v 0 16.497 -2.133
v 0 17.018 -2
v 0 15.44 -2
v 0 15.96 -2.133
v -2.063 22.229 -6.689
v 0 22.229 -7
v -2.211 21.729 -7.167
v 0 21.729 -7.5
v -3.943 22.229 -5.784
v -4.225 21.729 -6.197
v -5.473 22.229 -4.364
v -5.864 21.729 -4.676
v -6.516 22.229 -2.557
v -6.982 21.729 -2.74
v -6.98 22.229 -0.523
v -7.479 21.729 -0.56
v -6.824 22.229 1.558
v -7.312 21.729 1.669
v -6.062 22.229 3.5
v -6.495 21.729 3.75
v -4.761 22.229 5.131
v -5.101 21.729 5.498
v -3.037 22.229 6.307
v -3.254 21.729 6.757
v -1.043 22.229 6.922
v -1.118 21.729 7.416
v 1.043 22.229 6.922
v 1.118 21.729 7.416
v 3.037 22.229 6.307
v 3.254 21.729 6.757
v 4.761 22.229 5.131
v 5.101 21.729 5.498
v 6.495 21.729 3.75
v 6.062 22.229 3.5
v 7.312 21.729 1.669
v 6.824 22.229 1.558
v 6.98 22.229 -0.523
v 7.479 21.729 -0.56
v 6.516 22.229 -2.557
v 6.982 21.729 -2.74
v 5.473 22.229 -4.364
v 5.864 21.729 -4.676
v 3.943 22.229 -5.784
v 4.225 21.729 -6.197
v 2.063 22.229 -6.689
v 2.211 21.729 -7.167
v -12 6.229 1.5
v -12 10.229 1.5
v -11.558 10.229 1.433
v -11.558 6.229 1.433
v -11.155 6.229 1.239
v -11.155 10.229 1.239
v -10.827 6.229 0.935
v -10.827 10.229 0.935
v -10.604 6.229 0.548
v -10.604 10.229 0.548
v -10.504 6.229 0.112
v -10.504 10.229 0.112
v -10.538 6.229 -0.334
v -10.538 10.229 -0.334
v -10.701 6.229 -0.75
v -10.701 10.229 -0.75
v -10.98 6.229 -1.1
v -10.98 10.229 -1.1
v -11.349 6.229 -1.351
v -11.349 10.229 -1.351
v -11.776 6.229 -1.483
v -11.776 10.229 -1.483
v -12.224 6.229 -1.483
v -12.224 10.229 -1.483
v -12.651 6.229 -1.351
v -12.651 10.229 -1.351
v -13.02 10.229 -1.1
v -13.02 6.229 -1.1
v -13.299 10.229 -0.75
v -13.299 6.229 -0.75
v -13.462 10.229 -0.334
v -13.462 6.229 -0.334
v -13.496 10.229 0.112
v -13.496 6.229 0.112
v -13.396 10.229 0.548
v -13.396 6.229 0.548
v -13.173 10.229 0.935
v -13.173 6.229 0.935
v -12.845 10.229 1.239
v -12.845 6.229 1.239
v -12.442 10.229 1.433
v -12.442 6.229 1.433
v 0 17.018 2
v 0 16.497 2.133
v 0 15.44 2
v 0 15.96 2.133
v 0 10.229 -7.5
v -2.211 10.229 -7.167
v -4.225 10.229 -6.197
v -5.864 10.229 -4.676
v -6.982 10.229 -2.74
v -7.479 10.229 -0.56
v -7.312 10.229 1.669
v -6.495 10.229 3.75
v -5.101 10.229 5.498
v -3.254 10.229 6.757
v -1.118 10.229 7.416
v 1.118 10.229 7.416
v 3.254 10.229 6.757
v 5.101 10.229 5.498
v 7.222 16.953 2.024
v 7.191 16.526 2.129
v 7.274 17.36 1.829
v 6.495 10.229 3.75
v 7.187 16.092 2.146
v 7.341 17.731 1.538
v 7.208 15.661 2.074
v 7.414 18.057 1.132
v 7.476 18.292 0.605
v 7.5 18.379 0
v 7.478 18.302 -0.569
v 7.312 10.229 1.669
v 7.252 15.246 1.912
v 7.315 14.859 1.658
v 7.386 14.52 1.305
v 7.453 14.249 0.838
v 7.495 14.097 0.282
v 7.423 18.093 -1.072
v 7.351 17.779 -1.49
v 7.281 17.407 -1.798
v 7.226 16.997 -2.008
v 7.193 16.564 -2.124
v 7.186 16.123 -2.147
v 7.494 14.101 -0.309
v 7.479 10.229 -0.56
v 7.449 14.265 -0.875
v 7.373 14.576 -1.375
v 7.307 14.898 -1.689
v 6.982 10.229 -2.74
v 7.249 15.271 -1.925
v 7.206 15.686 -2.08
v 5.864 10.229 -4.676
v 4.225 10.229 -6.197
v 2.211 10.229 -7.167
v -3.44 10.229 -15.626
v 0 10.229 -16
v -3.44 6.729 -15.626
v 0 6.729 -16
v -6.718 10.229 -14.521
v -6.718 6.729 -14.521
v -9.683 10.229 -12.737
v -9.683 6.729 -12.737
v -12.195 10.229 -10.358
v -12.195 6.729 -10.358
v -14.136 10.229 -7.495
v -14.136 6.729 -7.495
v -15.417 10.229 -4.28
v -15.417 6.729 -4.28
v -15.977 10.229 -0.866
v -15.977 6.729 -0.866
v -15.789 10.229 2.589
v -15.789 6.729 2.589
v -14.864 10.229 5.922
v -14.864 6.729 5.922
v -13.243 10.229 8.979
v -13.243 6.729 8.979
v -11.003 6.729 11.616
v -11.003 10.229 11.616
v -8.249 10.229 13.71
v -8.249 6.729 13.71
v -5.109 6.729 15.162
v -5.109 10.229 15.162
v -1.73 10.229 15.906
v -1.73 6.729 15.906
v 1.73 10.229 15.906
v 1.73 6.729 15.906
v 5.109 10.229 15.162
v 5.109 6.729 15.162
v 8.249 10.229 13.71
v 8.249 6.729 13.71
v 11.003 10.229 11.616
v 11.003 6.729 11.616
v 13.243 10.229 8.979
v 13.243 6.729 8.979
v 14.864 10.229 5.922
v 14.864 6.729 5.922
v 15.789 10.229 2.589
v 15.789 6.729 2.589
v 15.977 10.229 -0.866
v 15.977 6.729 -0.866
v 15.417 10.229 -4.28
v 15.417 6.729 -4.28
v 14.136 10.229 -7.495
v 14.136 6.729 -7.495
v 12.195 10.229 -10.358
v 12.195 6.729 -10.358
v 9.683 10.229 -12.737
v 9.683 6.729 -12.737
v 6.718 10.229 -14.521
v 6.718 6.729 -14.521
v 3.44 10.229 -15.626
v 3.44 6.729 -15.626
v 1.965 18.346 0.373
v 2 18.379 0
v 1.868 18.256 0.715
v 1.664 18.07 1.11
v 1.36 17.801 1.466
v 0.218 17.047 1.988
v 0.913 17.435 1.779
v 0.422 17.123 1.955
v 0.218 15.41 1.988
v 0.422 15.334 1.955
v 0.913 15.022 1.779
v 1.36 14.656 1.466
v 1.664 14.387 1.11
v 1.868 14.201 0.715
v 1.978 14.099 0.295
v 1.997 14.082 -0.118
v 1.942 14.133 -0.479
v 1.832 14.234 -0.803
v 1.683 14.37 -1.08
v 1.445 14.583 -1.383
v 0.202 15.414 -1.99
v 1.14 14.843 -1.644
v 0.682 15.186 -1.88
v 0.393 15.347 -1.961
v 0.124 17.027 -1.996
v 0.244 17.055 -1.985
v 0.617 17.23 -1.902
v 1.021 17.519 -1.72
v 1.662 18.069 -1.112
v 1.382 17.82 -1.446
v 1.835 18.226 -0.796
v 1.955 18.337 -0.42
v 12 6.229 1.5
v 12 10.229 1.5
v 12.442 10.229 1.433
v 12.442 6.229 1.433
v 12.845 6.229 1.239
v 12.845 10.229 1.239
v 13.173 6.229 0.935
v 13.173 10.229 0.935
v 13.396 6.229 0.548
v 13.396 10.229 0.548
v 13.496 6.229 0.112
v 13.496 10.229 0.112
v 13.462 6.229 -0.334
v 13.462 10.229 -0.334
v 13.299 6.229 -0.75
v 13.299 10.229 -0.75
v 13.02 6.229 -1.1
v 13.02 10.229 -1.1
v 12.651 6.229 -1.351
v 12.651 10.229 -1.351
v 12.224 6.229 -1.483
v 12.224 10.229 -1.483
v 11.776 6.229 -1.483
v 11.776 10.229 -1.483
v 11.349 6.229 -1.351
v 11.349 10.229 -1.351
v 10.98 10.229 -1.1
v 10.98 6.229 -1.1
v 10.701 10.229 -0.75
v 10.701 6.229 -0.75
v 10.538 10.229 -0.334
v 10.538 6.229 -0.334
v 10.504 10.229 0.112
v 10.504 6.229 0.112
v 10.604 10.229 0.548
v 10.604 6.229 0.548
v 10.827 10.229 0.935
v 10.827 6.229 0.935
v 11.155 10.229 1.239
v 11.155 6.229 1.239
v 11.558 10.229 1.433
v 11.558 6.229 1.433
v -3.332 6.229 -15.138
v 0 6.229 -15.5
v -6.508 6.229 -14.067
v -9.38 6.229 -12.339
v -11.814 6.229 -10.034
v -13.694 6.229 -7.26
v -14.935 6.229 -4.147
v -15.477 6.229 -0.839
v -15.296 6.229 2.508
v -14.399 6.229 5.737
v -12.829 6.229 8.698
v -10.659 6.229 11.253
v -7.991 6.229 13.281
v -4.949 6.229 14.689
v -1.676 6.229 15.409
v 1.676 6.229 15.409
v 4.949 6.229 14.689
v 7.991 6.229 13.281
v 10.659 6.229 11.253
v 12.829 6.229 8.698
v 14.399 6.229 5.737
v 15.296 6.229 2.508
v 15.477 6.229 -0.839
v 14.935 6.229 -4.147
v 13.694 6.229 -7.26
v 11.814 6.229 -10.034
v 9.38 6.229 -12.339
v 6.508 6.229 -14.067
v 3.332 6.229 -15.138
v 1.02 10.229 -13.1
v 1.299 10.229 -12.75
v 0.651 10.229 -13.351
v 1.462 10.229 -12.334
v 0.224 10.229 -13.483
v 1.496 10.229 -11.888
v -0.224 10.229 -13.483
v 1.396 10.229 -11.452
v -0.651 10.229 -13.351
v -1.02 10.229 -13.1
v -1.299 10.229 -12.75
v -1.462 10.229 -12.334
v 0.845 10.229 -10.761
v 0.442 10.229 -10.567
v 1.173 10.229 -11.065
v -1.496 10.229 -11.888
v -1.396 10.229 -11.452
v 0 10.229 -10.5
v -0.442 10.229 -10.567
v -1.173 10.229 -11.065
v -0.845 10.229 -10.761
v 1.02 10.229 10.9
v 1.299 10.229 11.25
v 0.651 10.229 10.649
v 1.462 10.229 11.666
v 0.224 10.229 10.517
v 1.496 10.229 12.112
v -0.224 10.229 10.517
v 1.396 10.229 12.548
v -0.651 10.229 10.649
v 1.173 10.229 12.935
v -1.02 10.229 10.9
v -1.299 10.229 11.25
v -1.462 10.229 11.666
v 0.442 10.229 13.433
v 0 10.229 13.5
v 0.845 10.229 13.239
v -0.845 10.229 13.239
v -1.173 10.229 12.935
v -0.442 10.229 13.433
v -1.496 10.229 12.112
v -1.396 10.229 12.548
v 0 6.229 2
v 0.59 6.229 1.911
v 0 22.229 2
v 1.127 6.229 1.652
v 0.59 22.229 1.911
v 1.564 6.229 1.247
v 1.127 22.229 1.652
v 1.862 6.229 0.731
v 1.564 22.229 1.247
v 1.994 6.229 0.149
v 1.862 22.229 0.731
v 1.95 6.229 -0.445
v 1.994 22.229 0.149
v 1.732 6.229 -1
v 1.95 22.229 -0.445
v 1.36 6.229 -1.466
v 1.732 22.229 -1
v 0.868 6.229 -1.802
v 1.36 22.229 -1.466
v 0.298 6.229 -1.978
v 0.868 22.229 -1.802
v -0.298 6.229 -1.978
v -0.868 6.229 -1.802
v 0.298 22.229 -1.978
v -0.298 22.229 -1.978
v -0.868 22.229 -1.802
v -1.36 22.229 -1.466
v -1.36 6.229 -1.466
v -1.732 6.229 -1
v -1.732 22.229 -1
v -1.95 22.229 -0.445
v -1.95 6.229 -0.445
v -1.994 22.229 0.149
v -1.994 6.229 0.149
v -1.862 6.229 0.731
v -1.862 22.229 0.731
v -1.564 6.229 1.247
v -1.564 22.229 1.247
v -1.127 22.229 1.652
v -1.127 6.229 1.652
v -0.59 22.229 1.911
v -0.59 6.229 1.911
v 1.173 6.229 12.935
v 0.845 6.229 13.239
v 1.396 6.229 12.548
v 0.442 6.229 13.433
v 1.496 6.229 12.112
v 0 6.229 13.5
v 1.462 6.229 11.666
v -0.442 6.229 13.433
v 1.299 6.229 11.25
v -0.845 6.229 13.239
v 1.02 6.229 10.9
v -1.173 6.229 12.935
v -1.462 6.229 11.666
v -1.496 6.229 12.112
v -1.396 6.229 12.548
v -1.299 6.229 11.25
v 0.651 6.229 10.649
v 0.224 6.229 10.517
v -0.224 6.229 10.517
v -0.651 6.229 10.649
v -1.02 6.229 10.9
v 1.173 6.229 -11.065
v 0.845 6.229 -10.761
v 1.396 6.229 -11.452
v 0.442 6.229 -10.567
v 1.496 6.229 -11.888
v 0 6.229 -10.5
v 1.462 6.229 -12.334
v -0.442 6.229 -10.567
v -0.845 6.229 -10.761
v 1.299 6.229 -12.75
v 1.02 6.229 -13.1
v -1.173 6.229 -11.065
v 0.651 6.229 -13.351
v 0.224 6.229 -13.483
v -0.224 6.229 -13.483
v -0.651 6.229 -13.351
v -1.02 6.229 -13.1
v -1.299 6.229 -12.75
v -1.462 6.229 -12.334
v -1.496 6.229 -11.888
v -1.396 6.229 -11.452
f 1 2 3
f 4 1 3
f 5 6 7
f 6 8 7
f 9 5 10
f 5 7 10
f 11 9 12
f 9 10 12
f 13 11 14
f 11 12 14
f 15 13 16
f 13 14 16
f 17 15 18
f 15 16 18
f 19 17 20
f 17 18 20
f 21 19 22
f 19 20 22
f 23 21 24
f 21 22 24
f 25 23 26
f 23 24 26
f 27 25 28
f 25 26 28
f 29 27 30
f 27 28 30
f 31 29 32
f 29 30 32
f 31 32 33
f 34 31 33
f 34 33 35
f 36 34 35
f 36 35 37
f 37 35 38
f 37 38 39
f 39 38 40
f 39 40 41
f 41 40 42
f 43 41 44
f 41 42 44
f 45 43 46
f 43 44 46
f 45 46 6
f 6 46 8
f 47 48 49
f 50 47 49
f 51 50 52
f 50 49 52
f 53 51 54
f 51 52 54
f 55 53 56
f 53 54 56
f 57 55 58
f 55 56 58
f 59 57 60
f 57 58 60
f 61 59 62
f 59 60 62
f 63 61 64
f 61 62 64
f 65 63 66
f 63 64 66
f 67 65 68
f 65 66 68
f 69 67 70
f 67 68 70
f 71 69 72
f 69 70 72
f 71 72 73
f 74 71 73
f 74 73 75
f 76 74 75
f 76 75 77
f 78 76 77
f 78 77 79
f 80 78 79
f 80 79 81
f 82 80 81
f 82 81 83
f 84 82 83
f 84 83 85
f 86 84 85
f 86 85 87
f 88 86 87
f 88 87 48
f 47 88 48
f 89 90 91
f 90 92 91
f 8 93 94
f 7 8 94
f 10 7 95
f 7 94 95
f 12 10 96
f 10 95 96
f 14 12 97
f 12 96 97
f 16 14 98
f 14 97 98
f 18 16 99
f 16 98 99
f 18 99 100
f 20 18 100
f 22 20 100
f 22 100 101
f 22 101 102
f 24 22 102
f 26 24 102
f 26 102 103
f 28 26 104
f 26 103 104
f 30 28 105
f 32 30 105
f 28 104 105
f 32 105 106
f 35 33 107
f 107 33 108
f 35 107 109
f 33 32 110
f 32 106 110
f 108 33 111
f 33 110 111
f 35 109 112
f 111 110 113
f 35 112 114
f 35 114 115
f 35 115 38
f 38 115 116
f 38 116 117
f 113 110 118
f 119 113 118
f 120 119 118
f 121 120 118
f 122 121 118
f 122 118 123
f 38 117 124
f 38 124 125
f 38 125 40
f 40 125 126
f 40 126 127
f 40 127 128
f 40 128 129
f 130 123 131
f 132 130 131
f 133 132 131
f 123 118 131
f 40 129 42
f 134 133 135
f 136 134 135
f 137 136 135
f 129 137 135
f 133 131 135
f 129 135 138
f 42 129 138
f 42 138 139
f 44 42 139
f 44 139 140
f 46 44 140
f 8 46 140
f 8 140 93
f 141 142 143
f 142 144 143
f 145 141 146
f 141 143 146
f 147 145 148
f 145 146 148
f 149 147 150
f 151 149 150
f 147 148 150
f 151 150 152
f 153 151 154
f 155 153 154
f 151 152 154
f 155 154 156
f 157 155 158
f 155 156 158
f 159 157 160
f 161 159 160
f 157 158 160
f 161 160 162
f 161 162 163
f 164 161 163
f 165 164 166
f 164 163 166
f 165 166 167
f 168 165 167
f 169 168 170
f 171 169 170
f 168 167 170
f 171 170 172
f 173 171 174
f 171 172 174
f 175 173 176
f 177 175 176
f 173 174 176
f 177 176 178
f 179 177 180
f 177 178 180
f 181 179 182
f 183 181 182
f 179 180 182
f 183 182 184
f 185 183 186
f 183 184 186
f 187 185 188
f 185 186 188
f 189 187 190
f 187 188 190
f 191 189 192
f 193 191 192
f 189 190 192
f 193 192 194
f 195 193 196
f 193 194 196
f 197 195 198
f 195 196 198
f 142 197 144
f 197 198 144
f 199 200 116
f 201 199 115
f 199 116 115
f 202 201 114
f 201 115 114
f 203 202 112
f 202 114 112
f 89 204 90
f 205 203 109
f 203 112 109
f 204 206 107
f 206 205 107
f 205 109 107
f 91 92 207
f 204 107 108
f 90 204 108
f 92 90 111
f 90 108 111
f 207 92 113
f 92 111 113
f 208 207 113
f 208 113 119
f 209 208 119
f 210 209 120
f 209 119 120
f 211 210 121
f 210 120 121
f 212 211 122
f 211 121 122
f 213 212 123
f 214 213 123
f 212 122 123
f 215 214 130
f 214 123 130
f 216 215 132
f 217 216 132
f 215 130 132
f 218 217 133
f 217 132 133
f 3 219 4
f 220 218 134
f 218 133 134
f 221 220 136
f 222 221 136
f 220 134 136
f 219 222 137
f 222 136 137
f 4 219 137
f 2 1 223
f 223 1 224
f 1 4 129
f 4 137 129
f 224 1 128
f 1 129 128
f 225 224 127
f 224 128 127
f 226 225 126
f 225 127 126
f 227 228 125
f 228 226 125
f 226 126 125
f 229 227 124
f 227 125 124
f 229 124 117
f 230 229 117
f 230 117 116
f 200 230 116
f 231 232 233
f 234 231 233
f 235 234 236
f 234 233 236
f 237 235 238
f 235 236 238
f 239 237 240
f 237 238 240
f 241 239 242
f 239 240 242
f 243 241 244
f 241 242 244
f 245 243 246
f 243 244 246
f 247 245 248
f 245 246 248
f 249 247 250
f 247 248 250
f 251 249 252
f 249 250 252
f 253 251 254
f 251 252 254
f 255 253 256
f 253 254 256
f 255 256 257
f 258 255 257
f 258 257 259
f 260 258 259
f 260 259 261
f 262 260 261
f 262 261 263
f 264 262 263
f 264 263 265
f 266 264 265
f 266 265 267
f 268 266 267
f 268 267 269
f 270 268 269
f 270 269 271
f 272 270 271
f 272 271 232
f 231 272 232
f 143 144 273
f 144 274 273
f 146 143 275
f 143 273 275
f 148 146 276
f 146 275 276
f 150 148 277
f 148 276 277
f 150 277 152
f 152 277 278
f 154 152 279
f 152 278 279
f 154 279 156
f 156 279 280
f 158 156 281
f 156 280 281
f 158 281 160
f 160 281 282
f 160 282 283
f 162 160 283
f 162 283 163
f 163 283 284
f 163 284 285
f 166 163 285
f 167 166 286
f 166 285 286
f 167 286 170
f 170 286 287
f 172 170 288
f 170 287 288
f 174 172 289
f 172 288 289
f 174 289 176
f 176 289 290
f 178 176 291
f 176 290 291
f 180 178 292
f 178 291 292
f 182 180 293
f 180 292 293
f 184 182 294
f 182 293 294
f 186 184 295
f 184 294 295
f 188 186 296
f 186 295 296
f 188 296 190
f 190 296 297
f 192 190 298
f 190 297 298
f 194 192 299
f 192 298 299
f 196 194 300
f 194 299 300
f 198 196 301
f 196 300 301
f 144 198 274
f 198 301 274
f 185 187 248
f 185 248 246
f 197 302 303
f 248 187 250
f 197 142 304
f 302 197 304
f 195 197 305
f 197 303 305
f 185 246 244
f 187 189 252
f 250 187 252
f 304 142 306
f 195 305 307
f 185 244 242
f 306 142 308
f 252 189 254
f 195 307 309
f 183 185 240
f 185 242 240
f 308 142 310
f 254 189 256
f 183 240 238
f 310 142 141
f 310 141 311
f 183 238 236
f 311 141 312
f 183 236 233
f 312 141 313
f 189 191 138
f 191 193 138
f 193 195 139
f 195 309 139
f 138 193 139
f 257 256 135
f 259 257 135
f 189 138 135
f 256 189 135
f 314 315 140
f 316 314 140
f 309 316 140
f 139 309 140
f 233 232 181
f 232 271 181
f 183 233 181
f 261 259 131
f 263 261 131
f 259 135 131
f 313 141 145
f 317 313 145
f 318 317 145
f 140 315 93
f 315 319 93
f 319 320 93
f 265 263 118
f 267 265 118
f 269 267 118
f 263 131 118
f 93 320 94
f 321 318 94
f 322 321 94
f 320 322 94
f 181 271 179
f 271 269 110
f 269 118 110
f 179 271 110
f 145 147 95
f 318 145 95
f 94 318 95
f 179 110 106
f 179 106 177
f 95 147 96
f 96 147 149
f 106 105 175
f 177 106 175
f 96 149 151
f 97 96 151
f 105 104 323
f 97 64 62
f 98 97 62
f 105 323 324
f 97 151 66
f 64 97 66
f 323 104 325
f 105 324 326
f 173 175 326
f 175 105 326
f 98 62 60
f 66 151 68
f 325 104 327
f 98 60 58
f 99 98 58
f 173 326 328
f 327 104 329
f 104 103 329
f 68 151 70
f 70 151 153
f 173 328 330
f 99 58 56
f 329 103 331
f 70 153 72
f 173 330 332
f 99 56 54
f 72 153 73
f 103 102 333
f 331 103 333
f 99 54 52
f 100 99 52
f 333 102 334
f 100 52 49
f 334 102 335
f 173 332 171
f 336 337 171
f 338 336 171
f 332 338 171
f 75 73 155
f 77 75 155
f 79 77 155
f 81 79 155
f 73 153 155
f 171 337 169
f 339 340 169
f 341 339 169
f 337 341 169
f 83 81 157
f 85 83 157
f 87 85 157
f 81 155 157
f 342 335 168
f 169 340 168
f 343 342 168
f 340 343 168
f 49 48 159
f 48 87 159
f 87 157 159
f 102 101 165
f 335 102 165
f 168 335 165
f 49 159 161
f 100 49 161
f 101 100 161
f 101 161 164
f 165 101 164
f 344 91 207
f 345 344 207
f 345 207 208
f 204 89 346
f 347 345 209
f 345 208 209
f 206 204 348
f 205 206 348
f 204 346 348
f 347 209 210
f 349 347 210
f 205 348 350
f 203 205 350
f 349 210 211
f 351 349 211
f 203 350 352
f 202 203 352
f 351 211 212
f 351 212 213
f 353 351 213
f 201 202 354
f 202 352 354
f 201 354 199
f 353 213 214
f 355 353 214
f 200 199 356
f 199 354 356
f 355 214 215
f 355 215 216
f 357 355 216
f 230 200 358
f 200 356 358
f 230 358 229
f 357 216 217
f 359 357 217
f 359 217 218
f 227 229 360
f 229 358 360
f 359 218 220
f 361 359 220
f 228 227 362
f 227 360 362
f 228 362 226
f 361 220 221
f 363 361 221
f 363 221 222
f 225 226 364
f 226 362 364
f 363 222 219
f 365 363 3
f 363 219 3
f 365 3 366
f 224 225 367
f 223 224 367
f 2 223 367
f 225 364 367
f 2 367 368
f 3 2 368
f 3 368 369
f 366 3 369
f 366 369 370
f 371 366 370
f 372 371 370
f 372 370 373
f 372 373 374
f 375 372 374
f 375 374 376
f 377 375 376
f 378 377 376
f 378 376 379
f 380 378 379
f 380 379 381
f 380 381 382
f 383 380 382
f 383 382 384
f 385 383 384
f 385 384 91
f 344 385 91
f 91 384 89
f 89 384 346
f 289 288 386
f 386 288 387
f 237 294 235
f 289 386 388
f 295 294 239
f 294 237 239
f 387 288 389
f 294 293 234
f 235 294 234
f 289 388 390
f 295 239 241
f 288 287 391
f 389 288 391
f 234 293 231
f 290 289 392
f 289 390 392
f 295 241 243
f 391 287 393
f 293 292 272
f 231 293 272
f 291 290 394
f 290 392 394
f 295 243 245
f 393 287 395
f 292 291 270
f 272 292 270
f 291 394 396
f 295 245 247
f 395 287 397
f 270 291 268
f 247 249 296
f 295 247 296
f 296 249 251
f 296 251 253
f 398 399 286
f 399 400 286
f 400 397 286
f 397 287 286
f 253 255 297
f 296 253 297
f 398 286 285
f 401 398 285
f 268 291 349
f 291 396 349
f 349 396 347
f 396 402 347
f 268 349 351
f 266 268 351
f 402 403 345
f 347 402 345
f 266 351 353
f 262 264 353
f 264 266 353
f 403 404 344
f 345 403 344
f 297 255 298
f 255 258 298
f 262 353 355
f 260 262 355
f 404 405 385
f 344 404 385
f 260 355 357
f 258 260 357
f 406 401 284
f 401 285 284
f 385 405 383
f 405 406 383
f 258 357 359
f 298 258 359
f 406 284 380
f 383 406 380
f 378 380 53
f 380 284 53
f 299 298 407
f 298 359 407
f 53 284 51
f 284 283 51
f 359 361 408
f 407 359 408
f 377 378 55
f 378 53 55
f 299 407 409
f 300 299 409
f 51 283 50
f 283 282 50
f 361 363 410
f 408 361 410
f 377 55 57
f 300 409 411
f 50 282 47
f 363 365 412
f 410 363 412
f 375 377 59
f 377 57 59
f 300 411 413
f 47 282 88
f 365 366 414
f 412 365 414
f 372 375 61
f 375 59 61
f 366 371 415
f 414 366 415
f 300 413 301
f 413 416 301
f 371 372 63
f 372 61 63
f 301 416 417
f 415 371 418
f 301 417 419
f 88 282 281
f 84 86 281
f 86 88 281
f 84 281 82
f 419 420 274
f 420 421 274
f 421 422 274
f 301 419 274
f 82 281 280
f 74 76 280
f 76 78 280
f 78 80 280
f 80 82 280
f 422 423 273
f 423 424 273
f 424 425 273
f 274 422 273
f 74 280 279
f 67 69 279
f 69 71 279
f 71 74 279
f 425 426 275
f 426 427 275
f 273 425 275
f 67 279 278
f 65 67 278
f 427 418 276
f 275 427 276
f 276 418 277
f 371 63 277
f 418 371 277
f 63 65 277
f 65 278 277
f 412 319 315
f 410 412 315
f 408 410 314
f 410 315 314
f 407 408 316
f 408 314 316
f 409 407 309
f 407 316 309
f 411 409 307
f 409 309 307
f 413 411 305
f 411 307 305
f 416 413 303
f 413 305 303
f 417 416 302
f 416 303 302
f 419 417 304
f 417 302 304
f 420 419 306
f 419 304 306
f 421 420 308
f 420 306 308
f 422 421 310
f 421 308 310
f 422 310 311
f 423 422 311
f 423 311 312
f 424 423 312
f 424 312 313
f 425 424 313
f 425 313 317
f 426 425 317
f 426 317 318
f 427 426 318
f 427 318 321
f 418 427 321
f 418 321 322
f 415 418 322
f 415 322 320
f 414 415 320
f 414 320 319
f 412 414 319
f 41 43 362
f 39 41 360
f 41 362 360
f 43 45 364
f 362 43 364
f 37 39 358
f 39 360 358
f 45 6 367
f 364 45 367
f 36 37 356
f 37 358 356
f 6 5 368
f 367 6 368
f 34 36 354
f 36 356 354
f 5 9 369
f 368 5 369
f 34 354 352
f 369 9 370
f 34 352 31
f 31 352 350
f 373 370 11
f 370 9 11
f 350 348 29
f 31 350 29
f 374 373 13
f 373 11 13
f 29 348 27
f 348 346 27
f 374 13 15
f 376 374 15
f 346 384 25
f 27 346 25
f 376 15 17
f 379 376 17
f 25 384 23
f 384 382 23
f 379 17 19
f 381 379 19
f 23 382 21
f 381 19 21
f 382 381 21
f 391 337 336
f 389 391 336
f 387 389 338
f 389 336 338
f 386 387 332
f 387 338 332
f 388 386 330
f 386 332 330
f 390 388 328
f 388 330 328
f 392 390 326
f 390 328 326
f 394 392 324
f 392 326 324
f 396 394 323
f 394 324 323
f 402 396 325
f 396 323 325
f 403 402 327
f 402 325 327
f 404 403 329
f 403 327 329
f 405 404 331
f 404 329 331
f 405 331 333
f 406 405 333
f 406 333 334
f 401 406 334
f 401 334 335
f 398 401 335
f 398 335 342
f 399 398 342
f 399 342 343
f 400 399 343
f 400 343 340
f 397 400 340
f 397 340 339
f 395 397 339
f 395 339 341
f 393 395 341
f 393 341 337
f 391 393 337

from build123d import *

# Parameters (mm, degrees)
SKETCH3_R                    = 2
CUT_EXTRUDE1_DEPTH           = 28.712812921
M4_CLEARANCE_HOLE1_OUTLINE_W = 2.15
M4_CLEARANCE_HOLE1_OUTLINE_H = 7.500042463
SKETCH13_R                   = 1.5
CUT_EXTRUDE3_DEPTH           = 26.612496997


# Read off the part's stored shape, not the designer's step: M4 Clearance Hole1
with BuildPart() as part:
    # Sketch2 → Revolve1 (revolve)
    with BuildSketch(Plane.XY, mode=Mode.PRIVATE) as revolve1_sk:
        Polygon((0, 22.228628213), (7, 22.228628213), (7.5, 21.728628213), (7.5, 10.228628213), (16, 10.228628213), (16, 6.728628213), (15.5, 6.228628213), (0, 6.228628213), align=None)
    revolve(revolve1_sk.sketch.rotate(Axis((0, 0, 0), (0, 1, 0)), 90), axis=Axis((0, 0, 0), (0, 1, 0)))

    # Sketch3 → Cut-Extrude1 (cut, through all)
    with BuildSketch(Plane(origin=(0, 22.228628213, 0), x_dir=(1, 0, 0), z_dir=(0, 1, 0))):
        with Locations(Location((0, 0, 0), (0, 0, 270))):
            Circle(SKETCH3_R)
    extrude(amount=-CUT_EXTRUDE1_DEPTH, mode=Mode.SUBTRACT)

    # M4 Clearance Hole1 outline → M4 Clearance Hole1 (revolve, cut)
    with BuildSketch(Plane(origin=(0, 16.228628213, 0), x_dir=(0, 1, 0), z_dir=(0, 0, -1))):
        with Locations((1.075, 3.750021232)):
            Rectangle(M4_CLEARANCE_HOLE1_OUTLINE_W, M4_CLEARANCE_HOLE1_OUTLINE_H)
    revolve(axis=Axis((0, 16.228628213, 0), (1, 0, 0)), mode=Mode.SUBTRACT)

    # Sketch13 → Cut-Extrude3 (cut, through all)
    with BuildSketch(Plane(origin=(0, 10.228628213, 0), x_dir=(1, 0, 0), z_dir=(0, 1, 0))):
        with Locations(Location((-12, 0, 0), (0, 0, 270))):
            Circle(SKETCH13_R)
        with Locations(Location((0, 12, 0), (0, 0, 270))):
            Circle(SKETCH13_R)
        with Locations(Location((12, 0, 0), (0, 0, 270))):
            Circle(SKETCH13_R)
        with Locations(Location((0, -12, 0), (0, 0, 270))):
            Circle(SKETCH13_R)
    extrude(amount=-CUT_EXTRUDE3_DEPTH, mode=Mode.SUBTRACT)


solid = part.part
